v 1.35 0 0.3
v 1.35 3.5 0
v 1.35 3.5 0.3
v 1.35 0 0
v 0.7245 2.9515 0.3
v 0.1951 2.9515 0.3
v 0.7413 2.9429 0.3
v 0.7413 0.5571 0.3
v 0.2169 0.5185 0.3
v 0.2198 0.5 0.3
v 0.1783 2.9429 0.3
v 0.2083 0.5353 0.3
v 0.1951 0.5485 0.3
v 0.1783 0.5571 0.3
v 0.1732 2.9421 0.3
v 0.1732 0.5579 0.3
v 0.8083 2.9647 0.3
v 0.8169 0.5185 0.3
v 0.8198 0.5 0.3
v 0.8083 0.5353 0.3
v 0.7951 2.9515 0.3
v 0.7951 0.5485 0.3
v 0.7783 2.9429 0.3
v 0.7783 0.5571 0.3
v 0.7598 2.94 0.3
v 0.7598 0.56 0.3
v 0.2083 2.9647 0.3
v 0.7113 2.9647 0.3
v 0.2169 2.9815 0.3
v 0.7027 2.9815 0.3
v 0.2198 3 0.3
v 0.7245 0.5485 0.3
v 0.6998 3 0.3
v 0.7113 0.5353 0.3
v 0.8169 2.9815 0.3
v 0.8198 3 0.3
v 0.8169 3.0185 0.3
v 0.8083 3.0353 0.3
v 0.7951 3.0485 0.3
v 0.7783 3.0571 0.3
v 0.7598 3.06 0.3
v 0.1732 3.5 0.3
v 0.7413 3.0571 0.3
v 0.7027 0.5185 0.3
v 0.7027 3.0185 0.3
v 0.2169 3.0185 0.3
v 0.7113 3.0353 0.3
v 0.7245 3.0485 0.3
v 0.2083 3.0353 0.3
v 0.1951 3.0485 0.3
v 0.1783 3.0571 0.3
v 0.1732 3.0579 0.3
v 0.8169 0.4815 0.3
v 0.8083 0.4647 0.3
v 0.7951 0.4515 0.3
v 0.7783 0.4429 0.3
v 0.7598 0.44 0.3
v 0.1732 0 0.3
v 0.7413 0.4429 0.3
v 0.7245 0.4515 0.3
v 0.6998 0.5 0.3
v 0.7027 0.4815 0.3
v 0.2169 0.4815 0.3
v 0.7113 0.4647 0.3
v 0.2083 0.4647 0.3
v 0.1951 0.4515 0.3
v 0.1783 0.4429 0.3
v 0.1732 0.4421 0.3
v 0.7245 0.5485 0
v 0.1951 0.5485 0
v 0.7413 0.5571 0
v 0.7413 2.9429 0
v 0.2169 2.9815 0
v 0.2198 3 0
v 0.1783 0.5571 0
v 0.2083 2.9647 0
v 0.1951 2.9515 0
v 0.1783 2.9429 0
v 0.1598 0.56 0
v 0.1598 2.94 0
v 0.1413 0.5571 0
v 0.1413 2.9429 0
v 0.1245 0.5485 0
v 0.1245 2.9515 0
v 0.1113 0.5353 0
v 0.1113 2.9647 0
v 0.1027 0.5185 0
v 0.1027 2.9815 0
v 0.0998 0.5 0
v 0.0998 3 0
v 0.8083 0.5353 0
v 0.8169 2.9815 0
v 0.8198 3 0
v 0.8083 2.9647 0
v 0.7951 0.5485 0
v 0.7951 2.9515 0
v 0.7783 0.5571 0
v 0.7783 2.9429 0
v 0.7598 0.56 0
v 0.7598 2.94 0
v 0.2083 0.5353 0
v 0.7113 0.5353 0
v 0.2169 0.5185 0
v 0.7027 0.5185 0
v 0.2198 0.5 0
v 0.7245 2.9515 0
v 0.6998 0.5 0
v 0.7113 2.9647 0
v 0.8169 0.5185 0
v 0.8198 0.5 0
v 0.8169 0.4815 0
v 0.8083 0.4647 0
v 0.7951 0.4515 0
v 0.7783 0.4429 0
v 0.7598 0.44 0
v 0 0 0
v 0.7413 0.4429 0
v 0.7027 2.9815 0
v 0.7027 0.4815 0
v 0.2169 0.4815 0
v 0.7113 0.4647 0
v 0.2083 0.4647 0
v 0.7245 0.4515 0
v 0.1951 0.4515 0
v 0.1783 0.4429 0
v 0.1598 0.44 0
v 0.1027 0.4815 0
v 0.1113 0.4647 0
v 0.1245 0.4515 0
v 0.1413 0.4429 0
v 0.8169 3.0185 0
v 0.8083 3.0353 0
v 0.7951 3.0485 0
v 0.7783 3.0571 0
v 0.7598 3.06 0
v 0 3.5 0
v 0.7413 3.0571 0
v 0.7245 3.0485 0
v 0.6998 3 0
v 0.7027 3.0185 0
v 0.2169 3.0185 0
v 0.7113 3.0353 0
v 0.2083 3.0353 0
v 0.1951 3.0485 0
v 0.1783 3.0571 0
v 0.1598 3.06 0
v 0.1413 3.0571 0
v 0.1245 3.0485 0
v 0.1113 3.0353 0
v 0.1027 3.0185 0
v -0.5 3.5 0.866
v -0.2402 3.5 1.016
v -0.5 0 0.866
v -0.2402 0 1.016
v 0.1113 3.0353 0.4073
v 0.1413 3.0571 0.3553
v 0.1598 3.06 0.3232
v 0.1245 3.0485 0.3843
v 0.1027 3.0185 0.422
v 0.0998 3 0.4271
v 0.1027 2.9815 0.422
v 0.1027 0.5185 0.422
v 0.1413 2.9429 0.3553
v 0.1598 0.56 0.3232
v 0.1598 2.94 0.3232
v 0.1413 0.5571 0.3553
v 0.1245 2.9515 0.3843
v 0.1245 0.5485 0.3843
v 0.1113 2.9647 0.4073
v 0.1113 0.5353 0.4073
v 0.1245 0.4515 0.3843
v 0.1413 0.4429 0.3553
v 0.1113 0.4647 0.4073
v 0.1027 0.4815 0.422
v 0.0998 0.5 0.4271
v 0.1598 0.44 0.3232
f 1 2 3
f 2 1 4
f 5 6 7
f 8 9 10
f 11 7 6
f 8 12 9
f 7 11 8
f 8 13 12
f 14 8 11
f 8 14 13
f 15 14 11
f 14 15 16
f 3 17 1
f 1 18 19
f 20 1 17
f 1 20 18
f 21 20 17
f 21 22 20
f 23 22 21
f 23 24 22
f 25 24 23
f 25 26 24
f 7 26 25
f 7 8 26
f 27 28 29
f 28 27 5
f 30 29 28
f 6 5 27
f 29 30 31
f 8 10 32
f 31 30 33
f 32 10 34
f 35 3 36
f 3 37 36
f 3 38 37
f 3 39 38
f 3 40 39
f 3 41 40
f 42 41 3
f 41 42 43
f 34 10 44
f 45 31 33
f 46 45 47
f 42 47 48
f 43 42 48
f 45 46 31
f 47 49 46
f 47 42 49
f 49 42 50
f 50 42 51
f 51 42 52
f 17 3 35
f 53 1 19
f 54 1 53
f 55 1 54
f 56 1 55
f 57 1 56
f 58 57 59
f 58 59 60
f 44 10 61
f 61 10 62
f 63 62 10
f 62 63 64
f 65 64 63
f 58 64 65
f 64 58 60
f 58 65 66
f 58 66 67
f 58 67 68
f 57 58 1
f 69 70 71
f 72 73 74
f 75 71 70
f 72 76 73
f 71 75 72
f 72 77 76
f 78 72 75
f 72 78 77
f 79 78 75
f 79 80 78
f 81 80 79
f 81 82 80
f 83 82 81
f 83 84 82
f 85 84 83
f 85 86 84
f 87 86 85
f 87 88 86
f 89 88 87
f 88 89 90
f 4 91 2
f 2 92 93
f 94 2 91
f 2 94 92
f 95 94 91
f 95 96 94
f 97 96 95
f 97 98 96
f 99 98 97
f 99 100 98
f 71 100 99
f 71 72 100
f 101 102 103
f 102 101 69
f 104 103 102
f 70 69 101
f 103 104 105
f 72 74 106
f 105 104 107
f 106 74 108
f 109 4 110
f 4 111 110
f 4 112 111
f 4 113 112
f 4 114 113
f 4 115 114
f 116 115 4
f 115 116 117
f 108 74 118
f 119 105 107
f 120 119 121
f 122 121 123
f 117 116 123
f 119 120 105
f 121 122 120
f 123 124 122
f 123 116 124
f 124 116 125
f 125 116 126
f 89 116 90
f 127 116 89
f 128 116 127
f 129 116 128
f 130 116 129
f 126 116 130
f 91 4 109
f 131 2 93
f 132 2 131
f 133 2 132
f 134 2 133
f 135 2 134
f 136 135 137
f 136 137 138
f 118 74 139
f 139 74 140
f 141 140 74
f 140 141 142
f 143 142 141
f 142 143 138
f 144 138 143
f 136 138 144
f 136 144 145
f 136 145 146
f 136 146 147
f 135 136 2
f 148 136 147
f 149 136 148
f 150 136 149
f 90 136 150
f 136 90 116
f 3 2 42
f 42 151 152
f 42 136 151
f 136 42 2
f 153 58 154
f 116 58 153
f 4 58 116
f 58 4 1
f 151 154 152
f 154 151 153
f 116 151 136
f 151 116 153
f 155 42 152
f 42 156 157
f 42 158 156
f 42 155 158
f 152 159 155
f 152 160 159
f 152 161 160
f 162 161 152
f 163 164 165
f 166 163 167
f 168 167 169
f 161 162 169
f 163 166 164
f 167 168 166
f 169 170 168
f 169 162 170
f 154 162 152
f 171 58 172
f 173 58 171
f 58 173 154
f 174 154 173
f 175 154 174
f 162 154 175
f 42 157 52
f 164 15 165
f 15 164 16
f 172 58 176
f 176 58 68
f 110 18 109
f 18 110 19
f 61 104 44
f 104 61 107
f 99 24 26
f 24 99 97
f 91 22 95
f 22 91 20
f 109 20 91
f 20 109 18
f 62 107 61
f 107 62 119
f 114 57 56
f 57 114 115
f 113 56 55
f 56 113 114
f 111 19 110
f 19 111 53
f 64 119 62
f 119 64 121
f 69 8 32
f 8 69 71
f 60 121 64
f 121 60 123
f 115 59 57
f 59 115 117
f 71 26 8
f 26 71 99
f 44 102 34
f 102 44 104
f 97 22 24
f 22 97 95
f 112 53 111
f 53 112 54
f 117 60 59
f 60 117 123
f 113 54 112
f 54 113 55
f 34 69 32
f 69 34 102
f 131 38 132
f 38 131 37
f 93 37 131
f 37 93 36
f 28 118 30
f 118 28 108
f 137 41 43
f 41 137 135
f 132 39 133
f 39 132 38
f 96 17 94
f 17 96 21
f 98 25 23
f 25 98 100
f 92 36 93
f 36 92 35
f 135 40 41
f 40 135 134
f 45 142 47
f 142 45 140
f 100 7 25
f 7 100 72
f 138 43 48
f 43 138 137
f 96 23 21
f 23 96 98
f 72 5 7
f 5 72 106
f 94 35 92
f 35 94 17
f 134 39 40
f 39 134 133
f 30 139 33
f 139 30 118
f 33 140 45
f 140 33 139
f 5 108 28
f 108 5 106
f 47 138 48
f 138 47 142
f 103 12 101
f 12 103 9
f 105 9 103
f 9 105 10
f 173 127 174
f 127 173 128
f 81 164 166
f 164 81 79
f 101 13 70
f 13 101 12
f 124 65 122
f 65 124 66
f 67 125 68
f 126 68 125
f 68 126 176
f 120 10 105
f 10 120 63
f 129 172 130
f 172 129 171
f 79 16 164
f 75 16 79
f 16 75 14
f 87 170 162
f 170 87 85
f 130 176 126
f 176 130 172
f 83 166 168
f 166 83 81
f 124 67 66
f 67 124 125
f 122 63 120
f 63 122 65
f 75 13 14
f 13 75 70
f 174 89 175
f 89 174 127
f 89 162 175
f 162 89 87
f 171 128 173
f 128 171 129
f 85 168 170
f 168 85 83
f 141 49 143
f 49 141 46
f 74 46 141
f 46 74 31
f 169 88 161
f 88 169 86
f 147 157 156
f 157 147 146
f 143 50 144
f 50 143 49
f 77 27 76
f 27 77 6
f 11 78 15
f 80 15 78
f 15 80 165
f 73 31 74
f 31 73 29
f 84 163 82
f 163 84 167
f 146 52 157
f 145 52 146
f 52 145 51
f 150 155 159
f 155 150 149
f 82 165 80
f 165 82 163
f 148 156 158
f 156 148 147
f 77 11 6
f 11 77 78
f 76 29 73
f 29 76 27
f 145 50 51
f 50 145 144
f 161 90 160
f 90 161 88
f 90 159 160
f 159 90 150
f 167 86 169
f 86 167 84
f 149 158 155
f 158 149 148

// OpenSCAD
thick=0.3;
width=3.5;
rotate=30;

hole_d = 0.120;

v_offset=thick*sin(rotate);
h_offset=thick*cos(rotate);

difference() {
  union() {
    cube(size = [1.2+v_offset,width,thick]);

    translate(v=[h_offset,0,v_offset]) {
      rotate(a=[0,270-rotate,0]) {
        cube(size = [1,width,thick]);
      }
    }
  }
  translate(v=[h_offset+0.5,0,0]) {
    translate(v=[0,0.5,0]) {
      cylinder(h = thick, r=hole_d/2, $fn=20);
  }
    translate(v=[0,3,0]) {
      cylinder(h = thick, r=hole_d/2, $fn=20);
  }
 }
  translate(v=[h_offset-0.1,0,0]) {
    translate(v=[0,0.5,0]) {
      cylinder(h = thick*2, r=hole_d/2, $fn=20);
  }
    translate(v=[0,3,0]) {
      cylinder(h = thick*2, r=hole_d/2, $fn=20);
  }
 }
}
